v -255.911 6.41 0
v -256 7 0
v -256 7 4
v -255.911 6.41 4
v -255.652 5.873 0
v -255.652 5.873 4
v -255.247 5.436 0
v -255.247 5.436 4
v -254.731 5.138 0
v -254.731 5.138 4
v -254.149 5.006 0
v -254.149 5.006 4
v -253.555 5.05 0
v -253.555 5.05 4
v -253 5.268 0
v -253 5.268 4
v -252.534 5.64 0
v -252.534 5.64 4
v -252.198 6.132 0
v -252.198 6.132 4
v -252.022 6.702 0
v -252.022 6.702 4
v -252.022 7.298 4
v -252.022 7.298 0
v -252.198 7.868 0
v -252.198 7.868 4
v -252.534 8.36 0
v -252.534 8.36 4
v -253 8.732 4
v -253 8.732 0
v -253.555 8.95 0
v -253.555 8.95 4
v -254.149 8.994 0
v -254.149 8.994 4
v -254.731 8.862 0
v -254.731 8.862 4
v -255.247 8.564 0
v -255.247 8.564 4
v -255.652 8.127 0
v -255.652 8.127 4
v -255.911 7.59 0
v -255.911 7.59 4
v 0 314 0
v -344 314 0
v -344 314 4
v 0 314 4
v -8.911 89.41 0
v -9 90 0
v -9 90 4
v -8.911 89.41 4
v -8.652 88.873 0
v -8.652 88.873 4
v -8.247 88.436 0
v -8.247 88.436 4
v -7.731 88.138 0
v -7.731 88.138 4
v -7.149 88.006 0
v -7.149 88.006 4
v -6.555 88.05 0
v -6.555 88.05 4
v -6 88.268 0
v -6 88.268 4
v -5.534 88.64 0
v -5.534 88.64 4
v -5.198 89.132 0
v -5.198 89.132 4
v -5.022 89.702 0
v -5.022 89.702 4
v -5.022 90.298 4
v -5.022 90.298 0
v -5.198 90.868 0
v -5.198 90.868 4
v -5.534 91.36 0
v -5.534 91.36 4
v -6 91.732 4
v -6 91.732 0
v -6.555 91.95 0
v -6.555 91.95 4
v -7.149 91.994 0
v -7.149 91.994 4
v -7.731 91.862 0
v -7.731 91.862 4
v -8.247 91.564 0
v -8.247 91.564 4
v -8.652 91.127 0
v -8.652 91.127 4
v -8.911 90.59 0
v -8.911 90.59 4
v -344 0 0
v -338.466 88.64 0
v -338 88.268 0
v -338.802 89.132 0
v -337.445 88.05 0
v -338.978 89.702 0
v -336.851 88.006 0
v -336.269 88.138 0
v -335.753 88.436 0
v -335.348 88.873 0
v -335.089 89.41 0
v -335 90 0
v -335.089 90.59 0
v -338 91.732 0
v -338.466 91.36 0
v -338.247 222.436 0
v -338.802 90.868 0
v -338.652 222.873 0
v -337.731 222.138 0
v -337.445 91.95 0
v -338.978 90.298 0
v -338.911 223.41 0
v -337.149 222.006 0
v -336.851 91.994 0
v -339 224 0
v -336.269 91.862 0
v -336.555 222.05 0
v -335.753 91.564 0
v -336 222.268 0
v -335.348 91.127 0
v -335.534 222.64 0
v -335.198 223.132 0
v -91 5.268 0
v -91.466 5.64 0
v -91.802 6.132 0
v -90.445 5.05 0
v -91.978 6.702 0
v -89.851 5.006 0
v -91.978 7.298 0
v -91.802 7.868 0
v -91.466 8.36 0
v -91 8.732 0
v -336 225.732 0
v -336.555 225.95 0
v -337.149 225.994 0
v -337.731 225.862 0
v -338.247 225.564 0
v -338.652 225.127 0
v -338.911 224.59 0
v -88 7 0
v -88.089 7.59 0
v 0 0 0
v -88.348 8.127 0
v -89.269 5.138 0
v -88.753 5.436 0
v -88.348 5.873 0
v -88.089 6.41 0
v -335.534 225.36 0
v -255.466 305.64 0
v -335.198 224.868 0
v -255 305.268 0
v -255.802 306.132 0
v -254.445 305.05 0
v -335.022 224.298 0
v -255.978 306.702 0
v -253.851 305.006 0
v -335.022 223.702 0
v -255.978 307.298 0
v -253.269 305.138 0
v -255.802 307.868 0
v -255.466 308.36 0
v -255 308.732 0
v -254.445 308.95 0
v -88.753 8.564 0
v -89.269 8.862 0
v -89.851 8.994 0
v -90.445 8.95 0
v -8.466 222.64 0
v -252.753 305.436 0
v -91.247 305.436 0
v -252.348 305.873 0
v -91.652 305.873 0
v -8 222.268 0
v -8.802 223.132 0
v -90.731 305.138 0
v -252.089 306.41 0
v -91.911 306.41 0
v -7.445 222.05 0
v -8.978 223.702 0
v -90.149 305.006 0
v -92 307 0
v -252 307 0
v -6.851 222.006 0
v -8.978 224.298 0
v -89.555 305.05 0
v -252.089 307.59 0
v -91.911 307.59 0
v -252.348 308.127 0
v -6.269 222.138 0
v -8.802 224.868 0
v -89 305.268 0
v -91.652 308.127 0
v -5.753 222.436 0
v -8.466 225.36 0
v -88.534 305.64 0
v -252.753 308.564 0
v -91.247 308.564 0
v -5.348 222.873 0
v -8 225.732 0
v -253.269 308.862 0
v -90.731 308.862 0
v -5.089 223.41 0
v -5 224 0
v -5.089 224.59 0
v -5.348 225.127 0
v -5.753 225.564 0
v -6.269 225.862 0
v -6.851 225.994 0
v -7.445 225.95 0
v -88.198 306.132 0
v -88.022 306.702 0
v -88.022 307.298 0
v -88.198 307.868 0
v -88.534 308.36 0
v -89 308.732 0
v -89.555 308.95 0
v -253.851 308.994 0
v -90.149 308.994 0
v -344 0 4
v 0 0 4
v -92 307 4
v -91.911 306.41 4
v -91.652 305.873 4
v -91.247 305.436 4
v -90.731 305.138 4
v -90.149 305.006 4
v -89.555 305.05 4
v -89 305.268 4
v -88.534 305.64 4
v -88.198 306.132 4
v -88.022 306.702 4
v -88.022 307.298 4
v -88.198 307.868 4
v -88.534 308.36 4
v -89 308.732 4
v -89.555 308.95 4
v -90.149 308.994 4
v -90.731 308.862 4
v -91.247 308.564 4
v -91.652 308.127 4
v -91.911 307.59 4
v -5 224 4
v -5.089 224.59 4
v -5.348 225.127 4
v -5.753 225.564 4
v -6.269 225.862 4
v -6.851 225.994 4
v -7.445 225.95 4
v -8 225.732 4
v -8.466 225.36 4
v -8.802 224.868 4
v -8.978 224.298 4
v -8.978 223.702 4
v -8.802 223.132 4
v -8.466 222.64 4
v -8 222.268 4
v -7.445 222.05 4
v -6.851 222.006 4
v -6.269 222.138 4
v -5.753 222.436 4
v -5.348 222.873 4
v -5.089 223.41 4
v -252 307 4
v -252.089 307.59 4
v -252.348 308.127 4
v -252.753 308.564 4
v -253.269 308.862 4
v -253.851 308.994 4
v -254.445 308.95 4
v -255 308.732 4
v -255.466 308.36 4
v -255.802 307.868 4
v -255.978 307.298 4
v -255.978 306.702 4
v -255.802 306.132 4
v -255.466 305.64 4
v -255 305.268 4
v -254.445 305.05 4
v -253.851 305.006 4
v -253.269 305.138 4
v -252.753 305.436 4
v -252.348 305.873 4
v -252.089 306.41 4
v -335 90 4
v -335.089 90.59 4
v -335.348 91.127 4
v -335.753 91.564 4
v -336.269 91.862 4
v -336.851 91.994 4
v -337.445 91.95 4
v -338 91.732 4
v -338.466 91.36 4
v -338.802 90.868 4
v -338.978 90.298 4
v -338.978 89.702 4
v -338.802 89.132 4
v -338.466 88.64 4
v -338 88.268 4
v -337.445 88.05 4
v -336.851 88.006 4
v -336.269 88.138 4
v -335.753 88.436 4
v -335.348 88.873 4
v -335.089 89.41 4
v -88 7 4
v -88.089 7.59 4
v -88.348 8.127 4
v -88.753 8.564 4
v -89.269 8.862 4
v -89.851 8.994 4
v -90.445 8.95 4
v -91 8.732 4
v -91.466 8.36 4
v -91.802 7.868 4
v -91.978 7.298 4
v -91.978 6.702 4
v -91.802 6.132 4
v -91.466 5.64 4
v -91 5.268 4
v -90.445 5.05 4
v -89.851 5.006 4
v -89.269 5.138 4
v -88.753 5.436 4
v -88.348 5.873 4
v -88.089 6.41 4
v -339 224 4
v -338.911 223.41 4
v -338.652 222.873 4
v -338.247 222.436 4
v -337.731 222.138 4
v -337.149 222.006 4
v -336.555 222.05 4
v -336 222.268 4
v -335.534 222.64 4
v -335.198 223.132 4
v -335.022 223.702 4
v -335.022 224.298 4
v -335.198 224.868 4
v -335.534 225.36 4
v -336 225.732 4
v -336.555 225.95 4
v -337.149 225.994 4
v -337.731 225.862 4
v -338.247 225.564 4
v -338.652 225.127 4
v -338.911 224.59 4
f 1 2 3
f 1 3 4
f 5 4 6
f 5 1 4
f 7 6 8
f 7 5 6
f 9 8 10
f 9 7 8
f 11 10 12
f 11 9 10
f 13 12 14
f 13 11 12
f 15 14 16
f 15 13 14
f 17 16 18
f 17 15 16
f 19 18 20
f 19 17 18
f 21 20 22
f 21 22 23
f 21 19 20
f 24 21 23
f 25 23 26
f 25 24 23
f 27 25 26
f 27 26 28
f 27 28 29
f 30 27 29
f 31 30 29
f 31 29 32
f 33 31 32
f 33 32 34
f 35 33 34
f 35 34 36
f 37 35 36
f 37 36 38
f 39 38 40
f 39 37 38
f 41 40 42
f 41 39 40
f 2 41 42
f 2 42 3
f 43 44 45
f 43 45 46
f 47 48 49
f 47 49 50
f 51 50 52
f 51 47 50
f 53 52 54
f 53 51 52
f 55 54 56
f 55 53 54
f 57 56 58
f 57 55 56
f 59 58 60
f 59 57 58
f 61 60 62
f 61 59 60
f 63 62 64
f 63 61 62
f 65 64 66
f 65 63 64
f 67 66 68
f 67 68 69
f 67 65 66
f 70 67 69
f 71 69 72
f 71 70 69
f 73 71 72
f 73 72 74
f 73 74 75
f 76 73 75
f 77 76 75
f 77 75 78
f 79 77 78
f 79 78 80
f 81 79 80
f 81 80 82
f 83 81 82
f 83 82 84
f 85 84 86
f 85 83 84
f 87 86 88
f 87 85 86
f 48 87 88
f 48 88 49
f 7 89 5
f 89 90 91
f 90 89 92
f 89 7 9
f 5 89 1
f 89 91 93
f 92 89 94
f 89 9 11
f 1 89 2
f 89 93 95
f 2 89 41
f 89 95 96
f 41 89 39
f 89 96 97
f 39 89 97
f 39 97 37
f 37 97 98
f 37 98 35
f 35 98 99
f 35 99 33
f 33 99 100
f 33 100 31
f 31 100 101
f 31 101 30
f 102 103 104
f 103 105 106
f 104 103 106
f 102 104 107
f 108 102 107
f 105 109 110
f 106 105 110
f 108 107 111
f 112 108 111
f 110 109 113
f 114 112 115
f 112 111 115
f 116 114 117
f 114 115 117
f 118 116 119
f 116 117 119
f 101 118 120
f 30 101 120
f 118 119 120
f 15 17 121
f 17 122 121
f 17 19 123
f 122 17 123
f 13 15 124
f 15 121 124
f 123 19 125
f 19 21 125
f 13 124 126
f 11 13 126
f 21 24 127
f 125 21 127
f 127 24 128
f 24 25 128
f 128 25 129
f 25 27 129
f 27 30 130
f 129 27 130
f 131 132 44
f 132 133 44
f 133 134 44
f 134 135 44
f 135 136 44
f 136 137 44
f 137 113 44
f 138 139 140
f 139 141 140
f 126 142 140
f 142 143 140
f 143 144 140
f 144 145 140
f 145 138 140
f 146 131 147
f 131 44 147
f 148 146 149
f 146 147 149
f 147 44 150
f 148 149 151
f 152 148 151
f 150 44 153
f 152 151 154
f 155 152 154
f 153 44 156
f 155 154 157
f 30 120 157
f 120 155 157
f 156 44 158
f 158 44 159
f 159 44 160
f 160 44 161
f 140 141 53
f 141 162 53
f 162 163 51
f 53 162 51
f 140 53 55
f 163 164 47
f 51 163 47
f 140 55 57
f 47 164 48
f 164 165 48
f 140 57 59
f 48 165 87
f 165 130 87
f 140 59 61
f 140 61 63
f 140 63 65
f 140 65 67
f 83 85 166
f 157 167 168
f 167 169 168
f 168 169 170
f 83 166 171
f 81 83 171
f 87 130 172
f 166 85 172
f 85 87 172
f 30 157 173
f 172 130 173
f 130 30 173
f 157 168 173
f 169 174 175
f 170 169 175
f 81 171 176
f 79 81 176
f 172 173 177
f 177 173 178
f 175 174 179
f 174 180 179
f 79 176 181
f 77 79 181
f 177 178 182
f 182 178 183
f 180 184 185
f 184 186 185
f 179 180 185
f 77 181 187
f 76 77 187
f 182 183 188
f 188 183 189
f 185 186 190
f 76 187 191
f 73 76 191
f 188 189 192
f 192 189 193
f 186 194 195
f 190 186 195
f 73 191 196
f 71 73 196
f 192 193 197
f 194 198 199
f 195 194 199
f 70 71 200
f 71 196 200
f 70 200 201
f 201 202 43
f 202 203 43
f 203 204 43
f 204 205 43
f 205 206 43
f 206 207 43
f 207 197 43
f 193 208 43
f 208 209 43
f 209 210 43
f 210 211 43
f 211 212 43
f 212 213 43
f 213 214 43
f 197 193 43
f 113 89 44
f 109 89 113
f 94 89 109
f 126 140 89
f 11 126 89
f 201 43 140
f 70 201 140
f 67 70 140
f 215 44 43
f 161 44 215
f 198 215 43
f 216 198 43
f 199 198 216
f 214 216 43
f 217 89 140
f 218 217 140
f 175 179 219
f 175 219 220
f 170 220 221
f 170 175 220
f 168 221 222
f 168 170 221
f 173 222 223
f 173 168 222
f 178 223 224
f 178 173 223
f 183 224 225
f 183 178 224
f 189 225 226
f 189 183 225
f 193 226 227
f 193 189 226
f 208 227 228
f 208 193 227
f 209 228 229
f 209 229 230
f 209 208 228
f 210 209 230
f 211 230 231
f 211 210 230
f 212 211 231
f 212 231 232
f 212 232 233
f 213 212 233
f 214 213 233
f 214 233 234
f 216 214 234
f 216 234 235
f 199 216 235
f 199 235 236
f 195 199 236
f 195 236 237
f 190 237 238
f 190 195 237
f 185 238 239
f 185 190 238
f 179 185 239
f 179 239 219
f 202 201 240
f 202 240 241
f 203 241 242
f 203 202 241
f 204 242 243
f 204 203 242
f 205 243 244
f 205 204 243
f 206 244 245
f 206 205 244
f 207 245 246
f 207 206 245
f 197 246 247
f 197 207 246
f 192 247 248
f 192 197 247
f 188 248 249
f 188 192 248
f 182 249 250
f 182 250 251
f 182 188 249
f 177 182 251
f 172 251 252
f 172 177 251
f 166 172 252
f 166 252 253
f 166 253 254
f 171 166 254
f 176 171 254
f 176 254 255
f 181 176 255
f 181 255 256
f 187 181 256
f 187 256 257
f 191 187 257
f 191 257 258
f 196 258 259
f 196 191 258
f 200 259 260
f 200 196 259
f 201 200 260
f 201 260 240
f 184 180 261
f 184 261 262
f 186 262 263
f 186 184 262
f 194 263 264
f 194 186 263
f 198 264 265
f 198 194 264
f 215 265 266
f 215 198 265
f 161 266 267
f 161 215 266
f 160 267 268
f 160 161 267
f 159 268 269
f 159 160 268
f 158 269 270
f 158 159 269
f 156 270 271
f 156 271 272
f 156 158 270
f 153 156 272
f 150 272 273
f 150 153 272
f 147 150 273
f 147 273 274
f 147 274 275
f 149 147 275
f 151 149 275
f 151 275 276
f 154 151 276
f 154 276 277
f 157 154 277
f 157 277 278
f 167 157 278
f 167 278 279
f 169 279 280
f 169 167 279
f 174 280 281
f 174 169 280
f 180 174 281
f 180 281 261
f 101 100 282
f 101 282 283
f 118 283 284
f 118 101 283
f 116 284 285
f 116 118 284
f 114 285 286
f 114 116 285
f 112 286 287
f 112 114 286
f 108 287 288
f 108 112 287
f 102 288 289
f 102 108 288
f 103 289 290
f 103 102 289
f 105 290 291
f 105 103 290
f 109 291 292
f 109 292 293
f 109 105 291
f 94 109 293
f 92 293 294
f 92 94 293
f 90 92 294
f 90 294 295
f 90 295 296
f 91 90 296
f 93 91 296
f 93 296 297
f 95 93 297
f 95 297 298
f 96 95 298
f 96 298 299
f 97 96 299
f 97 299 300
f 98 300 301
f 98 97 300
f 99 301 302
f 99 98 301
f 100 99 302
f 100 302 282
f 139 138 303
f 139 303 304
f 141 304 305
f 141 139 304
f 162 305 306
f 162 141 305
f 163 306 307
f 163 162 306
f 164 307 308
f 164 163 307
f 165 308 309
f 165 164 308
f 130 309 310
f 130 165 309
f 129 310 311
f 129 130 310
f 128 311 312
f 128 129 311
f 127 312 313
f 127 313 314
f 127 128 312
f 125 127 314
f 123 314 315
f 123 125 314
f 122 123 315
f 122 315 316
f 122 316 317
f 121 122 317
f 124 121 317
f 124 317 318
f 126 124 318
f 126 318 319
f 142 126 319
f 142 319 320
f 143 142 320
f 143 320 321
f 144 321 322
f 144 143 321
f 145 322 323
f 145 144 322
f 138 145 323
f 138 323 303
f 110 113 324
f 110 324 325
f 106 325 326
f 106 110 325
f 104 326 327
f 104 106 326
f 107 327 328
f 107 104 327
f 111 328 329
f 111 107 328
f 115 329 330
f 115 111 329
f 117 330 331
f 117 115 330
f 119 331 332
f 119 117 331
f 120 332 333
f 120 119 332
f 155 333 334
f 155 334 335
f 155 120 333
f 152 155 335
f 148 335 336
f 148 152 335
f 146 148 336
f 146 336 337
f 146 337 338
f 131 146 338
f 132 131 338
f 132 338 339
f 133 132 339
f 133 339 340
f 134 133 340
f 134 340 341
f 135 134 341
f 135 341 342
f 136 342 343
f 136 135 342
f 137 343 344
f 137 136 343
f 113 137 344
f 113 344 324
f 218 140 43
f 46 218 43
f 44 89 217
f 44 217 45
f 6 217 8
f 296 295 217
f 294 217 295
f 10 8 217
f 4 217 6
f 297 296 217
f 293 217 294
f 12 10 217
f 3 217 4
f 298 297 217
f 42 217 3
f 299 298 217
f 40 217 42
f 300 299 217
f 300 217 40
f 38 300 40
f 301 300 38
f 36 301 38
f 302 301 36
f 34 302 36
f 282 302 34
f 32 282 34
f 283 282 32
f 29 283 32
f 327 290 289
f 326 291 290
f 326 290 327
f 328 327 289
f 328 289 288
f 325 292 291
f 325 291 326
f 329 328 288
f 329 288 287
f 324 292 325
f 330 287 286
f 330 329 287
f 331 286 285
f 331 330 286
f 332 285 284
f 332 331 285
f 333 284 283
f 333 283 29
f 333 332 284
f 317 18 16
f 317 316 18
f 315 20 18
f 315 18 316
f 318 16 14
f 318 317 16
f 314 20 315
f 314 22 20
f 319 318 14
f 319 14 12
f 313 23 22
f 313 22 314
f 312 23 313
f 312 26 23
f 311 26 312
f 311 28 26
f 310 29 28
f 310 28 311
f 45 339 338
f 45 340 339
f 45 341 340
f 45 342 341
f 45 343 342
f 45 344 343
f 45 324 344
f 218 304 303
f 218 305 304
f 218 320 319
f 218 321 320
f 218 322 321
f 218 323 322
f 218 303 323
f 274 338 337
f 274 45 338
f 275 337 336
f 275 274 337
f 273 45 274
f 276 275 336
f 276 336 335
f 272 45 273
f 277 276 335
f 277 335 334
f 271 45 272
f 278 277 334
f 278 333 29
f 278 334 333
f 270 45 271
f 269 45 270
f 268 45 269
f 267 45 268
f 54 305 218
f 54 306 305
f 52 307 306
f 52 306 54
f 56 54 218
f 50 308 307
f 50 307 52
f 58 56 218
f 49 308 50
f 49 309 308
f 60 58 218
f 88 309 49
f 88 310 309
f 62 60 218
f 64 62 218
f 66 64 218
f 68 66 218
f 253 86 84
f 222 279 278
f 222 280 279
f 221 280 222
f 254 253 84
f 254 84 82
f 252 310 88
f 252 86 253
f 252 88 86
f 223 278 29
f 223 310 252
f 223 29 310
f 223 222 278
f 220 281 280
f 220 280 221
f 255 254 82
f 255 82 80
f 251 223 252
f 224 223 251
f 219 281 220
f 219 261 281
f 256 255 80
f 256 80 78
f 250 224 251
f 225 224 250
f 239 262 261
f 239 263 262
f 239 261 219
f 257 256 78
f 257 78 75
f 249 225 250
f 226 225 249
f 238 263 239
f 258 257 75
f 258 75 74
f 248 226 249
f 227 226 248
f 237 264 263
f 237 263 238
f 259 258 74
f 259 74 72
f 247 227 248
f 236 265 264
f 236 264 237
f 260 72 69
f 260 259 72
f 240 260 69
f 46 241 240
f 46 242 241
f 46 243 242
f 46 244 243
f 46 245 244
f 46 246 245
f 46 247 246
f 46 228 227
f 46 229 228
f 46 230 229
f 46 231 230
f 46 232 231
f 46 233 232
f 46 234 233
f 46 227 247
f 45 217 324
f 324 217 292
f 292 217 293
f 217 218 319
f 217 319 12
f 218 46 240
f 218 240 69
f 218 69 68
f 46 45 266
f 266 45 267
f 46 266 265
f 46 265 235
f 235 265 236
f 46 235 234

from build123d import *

# Parameters (mm, degrees)
SCHIZZO1_W                   = 344
SCHIZZO1_H                   = 314
SCHIZZO1_R                   = 2
ESTRUSIONE_ESTRUSIONE1_DEPTH = 4


with BuildPart() as part:
    # Schizzo1 → Estrusione-Estrusione1 (new body)
    with BuildSketch(Plane.XY):
        with Locations((-172, 157)):
            Rectangle(SCHIZZO1_W, SCHIZZO1_H)
        with Locations(Location((-90, 307, 0), (0, 0, 180))):
            Circle(SCHIZZO1_R, mode=Mode.SUBTRACT)
        with Locations((-7, 224)):
            Circle(SCHIZZO1_R, mode=Mode.SUBTRACT)
        with Locations((-254, 307)):
            Circle(SCHIZZO1_R, mode=Mode.SUBTRACT)
        with Locations(Location((-337, 224, 0), (0, 0, 180))):
            Circle(SCHIZZO1_R, mode=Mode.SUBTRACT)
        with Locations(Location((-254, 7, 0), (0, 0, 180))):
            Circle(SCHIZZO1_R, mode=Mode.SUBTRACT)
        with Locations((-337, 90)):
            Circle(SCHIZZO1_R, mode=Mode.SUBTRACT)
        with Locations(Location((-7, 90, 0), (0, 0, 180))):
            Circle(SCHIZZO1_R, mode=Mode.SUBTRACT)
        with Locations((-90, 7)):
            Circle(SCHIZZO1_R, mode=Mode.SUBTRACT)
    extrude(amount=ESTRUSIONE_ESTRUSIONE1_DEPTH)


solid = part.part
